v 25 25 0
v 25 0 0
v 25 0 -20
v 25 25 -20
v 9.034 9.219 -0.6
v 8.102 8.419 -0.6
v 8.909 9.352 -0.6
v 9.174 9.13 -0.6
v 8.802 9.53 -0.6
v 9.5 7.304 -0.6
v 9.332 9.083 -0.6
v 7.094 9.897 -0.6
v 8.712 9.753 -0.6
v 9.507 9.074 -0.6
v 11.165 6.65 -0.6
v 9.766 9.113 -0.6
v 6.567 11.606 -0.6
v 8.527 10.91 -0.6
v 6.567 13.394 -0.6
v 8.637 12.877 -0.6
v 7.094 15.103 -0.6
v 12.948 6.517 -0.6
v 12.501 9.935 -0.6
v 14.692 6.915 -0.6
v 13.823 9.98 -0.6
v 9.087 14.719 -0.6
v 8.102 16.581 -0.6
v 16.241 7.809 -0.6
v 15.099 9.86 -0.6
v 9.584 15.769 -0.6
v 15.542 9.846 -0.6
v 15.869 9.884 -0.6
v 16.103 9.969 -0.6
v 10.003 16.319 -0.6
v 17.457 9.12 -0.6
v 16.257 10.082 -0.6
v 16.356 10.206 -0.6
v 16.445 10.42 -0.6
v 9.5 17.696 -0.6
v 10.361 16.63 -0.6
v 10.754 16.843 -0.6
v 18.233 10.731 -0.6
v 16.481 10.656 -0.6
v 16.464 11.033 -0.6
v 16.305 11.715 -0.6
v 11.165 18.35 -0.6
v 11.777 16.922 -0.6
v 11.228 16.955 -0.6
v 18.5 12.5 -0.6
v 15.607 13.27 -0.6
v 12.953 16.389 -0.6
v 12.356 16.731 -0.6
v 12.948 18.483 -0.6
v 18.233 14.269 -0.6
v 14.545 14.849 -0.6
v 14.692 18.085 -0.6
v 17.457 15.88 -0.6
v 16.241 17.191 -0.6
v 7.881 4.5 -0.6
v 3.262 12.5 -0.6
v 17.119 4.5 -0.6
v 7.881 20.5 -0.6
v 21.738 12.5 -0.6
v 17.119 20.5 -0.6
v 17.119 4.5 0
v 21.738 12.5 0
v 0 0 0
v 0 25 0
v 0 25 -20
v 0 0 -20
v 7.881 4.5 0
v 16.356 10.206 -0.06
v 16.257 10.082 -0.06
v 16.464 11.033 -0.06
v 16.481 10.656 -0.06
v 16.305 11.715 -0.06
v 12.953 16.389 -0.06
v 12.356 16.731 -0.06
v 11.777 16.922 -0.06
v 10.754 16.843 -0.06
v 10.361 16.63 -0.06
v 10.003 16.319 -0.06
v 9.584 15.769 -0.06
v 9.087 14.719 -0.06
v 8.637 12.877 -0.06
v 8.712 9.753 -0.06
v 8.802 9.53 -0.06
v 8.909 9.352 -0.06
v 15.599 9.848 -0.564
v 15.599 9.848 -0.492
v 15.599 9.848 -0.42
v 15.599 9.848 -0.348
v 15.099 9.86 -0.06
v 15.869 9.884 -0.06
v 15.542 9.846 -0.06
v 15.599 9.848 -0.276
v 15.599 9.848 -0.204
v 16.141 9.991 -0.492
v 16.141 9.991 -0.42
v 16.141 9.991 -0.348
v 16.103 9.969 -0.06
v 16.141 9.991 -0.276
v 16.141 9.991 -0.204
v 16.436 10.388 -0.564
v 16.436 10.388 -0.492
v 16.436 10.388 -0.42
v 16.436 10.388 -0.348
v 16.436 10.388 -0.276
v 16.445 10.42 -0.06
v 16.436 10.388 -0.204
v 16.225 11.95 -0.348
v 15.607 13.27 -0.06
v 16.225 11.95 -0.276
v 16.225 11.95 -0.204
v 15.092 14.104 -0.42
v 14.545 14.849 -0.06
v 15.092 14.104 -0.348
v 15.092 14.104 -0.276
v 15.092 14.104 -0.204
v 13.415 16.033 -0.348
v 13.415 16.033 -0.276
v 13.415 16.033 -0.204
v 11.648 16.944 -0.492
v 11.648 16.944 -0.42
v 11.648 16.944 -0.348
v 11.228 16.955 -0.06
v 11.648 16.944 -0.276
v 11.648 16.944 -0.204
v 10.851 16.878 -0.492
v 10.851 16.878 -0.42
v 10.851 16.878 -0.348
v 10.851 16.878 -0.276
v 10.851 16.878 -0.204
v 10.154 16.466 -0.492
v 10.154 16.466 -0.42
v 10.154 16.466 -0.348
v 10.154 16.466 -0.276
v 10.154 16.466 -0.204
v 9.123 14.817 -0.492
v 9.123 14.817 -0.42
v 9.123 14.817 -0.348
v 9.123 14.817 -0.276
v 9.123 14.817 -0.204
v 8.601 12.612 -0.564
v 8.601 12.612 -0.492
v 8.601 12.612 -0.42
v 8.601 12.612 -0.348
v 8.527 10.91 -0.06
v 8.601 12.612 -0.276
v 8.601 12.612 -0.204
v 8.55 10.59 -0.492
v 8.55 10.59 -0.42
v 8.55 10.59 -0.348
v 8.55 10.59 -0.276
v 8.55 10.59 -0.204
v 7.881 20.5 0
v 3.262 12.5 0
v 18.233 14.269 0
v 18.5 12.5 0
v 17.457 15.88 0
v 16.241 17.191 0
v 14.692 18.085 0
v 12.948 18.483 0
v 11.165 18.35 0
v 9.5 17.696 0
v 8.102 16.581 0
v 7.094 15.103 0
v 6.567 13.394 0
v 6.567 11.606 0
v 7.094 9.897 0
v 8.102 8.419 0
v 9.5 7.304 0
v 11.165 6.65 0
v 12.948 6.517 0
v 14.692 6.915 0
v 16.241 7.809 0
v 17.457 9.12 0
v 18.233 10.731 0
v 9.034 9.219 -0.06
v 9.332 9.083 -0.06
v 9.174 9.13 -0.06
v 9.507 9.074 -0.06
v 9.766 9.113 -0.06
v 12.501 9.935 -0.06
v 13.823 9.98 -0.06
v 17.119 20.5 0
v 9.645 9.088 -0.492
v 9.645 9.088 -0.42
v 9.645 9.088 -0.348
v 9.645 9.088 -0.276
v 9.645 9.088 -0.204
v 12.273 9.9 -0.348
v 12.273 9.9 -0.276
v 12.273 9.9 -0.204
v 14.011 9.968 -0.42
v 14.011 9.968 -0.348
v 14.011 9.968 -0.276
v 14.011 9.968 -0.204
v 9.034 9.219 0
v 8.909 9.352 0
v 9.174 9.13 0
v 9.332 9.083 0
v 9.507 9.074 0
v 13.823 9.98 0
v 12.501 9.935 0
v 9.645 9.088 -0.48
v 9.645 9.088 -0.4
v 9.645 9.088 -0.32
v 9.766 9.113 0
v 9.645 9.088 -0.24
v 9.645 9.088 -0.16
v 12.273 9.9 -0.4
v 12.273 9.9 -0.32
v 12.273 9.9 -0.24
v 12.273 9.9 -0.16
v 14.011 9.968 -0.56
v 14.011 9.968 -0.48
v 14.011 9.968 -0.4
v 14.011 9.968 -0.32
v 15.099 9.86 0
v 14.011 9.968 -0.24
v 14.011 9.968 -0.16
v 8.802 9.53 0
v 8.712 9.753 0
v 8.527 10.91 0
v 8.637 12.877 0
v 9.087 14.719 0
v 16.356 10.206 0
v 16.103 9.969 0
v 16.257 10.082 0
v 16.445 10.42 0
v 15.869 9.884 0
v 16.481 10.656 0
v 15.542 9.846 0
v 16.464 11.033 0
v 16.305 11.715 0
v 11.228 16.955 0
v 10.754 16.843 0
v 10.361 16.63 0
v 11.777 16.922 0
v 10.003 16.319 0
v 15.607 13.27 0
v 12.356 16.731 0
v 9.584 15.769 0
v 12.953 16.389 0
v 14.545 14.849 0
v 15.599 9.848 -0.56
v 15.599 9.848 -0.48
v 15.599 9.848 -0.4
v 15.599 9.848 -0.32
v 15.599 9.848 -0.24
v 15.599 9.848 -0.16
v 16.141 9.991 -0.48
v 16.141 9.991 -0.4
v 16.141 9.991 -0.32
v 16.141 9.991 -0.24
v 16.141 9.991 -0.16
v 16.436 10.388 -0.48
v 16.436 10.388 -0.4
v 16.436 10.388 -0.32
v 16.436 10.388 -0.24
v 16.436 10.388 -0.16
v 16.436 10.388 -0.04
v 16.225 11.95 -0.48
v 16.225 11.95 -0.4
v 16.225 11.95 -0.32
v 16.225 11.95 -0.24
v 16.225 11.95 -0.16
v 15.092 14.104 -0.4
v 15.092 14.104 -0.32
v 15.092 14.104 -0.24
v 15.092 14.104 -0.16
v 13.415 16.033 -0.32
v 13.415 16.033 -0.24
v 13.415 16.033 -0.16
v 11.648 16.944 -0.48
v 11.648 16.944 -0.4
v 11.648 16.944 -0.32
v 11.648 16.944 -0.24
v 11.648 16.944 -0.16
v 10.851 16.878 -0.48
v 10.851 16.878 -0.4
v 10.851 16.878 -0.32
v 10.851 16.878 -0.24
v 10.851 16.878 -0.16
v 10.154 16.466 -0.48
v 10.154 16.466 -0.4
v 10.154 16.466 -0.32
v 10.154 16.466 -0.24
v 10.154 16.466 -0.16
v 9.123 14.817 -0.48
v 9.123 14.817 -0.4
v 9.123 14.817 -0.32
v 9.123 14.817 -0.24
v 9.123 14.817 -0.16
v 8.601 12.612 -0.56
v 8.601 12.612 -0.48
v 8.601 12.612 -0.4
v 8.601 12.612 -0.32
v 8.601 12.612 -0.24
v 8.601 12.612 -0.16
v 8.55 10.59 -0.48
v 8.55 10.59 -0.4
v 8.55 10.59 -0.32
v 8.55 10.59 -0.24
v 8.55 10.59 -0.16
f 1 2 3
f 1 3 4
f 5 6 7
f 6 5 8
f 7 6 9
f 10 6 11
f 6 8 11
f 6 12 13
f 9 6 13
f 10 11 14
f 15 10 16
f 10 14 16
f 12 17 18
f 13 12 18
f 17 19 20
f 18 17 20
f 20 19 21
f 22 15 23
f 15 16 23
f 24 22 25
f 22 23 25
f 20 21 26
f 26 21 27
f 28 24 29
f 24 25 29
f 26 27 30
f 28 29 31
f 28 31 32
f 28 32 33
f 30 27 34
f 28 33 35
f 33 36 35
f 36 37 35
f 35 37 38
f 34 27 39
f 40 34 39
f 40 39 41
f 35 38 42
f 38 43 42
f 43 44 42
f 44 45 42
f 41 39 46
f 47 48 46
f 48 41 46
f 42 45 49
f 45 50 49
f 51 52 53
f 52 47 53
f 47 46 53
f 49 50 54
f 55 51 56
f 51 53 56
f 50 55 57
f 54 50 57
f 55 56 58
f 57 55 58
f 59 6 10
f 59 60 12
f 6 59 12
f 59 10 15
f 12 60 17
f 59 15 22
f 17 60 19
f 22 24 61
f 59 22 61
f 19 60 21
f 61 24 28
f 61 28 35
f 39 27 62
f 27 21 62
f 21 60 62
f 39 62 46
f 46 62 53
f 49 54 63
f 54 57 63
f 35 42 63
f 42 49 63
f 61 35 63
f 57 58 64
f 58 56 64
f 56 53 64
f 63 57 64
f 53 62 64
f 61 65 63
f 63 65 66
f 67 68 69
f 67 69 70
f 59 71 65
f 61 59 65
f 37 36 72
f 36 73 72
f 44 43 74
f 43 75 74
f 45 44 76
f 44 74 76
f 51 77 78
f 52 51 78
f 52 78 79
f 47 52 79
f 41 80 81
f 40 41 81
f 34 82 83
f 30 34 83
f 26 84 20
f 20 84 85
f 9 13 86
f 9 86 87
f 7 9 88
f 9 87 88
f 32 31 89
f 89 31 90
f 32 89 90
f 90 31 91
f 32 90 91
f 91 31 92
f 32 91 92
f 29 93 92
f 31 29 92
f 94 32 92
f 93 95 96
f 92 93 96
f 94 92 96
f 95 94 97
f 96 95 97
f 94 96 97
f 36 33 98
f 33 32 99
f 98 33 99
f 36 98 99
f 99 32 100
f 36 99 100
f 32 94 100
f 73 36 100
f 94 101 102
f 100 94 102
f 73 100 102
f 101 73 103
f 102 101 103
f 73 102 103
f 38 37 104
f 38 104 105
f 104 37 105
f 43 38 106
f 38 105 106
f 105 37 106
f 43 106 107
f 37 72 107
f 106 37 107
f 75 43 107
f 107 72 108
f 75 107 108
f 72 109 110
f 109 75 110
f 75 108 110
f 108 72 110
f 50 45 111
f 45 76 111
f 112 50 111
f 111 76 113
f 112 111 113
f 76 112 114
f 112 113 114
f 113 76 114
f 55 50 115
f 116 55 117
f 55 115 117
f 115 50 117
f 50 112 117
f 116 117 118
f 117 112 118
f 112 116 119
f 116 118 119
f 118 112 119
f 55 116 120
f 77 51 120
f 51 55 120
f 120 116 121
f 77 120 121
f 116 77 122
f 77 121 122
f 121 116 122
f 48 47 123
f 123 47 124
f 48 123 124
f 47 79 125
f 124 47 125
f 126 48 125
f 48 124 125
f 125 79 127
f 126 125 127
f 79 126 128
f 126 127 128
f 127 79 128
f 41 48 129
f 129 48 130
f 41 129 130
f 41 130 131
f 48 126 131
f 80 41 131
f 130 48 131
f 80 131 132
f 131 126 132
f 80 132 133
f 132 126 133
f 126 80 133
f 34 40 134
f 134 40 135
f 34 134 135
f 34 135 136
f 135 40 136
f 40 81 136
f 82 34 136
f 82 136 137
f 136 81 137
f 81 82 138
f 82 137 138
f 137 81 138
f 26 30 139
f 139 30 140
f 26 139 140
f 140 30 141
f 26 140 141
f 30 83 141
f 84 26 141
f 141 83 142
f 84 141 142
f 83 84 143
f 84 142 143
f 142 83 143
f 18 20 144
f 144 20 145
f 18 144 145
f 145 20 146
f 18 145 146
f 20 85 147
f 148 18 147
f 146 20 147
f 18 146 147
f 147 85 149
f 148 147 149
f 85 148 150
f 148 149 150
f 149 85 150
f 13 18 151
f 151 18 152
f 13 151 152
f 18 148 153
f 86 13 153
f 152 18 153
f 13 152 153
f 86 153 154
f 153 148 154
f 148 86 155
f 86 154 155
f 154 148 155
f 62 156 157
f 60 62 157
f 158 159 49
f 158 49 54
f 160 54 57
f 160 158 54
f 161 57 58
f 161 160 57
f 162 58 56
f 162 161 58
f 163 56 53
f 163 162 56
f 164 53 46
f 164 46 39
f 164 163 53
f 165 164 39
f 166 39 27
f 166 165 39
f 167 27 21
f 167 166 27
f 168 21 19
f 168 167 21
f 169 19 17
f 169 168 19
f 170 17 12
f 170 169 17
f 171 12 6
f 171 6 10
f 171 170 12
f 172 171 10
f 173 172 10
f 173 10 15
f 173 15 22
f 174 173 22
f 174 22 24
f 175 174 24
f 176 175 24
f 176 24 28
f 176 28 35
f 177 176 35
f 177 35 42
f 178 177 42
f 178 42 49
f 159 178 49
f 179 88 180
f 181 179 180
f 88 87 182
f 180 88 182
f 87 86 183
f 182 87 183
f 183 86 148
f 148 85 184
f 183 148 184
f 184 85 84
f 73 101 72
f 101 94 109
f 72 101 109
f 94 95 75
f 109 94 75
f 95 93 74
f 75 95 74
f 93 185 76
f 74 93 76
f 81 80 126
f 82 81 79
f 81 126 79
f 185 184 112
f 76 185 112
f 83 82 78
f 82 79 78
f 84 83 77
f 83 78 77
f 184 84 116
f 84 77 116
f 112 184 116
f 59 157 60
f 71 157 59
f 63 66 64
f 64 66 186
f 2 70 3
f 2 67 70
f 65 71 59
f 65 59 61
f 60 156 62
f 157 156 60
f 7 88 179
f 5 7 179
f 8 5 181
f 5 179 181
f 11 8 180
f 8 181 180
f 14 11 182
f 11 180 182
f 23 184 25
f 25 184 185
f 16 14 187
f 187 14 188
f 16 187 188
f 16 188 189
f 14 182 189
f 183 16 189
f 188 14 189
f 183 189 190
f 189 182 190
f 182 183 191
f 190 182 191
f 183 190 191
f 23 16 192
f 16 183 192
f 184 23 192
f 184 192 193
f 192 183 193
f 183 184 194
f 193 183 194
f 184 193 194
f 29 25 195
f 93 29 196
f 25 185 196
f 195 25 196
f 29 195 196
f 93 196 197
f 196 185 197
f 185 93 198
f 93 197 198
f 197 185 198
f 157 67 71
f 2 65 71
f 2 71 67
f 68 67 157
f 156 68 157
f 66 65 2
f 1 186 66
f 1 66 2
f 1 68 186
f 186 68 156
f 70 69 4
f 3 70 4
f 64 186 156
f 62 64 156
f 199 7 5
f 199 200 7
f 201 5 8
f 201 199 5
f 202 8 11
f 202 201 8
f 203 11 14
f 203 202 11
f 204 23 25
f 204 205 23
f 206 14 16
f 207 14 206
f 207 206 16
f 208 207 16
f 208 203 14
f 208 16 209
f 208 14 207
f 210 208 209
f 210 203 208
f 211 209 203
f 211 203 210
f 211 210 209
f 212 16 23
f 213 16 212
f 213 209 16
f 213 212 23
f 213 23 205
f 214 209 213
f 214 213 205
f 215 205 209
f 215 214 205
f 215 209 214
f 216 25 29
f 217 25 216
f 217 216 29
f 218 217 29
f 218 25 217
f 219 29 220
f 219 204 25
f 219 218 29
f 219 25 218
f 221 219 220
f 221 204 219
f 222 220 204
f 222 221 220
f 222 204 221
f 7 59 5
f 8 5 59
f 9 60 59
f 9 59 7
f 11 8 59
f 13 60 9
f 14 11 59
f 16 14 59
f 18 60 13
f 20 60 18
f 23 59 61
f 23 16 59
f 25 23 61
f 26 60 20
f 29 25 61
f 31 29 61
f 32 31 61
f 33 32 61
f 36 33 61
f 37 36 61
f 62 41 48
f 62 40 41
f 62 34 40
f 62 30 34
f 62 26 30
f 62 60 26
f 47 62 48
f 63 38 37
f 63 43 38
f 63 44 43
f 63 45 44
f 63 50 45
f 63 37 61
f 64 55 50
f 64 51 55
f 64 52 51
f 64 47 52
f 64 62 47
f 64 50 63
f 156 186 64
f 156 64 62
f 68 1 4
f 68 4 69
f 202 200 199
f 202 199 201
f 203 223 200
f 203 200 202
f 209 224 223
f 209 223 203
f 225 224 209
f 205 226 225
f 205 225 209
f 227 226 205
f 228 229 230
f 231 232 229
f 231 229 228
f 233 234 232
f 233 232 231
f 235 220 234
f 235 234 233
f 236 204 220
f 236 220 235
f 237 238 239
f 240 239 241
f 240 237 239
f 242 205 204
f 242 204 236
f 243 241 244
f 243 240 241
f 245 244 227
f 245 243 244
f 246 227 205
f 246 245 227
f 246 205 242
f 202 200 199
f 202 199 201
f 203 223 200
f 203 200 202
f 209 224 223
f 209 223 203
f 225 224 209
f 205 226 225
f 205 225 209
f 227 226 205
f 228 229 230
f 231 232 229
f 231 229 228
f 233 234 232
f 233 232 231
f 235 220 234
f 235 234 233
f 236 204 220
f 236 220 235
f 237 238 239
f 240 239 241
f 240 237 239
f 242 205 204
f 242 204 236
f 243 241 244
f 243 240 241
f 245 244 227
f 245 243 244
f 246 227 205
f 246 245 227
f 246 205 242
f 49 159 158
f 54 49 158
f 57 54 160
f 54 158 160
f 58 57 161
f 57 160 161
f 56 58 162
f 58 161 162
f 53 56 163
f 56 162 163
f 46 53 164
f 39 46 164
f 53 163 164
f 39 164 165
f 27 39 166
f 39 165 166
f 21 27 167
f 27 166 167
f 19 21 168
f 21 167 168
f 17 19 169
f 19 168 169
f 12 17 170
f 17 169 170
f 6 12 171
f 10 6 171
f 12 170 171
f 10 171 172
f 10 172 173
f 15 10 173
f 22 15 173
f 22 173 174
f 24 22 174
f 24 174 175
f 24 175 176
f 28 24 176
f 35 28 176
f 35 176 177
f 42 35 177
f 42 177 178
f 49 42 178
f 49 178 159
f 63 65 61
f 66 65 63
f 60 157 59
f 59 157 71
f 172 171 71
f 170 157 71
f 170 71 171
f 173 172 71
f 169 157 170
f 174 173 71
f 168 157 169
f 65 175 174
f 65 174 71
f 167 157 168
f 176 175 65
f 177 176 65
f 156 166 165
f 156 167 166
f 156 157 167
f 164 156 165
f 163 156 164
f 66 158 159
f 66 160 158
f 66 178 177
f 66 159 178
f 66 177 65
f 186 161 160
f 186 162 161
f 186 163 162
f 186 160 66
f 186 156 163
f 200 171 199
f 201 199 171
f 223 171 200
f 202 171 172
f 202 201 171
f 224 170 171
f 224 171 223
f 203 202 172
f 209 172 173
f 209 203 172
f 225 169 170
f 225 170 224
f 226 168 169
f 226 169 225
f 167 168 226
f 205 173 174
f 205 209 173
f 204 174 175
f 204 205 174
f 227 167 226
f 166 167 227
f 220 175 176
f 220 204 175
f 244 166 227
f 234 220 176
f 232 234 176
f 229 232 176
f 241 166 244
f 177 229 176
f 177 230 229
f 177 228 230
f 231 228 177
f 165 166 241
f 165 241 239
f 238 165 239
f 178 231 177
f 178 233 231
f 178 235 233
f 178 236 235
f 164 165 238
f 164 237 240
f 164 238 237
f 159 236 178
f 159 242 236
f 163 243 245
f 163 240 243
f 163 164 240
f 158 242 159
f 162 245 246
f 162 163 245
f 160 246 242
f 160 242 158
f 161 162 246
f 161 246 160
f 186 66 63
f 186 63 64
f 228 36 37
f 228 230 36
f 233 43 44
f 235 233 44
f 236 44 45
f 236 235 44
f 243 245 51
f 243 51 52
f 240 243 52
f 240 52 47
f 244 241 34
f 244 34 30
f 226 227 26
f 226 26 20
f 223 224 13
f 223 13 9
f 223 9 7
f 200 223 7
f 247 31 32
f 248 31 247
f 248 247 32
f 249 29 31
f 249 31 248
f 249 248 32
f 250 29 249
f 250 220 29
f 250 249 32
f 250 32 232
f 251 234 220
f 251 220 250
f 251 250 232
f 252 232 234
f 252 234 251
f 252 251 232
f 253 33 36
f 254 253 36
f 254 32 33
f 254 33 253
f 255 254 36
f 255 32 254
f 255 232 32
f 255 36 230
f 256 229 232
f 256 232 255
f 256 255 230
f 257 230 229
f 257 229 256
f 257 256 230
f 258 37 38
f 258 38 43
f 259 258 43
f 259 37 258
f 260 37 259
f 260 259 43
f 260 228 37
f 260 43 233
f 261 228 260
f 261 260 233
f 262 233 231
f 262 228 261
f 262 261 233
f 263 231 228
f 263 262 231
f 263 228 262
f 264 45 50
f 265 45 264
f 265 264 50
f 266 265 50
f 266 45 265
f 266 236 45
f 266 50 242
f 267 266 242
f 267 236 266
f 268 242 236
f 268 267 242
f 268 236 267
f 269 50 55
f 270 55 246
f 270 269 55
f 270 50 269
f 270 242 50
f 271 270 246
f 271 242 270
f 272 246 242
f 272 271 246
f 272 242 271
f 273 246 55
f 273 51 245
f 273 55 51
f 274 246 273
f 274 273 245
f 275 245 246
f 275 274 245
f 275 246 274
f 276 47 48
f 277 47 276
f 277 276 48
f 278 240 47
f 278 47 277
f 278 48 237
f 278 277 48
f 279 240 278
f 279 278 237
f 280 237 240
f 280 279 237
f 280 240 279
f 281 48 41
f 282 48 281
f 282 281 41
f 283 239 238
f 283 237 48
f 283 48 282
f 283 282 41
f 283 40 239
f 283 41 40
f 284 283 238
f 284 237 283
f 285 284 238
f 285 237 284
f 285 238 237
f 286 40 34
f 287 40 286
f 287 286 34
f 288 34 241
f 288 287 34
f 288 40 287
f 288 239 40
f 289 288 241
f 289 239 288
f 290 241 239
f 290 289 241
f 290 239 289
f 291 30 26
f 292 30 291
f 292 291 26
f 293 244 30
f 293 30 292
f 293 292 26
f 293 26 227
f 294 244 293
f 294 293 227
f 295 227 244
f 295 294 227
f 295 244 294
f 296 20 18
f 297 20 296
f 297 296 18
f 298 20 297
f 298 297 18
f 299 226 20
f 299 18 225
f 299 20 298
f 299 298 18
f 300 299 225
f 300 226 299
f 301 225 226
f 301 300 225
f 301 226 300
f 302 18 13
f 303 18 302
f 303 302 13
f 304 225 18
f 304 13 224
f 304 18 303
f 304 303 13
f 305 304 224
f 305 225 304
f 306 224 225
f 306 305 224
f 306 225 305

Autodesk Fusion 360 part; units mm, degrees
sketch "Sketch1" plane through (0, 0, 0) normal (0, 0, 1) x (1, 0, 0) in component "Multipart Demo"
  line L0 (0, 0) -> (25, 0)
  line L1 (25, 0) -> (25, 25)
  line L2 (25, 25) -> (0, 25)
  line L3 (0, 25) -> (0, 0)
  line L4 (7.8812, 20.5) -> (3.2624, 12.5)
  line L5 (3.2624, 12.5) -> (7.8812, 4.5)
  line L6 (7.8812, 4.5) -> (17.1188, 4.5)
  line L7 (17.1188, 4.5) -> (21.7376, 12.5)
  line L8 (21.7376, 12.5) -> (17.1188, 20.5)
  line L9 (17.1188, 20.5) -> (7.8812, 20.5)
  circle A0 centre (12.5, 12.5) radius 6
  spline S0 degree 5 poles (8.9094, 9.3519) (9.0191, 9.2045) (9.2754, 9.0123) (9.7707, 9.0232) (10.6665, 9.4656) (12.2037, 10.0156) (14.0226, 10.0885) (15.8151, 9.6278) (16.7222, 10.0857) (16.468, 11.7824) (15.2326, 14.1604) (13.4321, 16.3126) (11.5676, 17.3295) (10.0315, 16.7793) (8.9918, 14.9633) (8.4816, 12.5578) (8.4559, 10.8091) (8.6176, 9.8966) (8.7998, 9.4993) (8.9094, 9.3519) knots 0 0 0 0 0 0 0.066667 0.133333 0.2 0.266667 0.333333 0.4 0.466667 0.533333 0.6 0.666667 0.733333 0.8 0.866667 0.933333 1 1 1 1 1 1
  line L10 (13.9946, 9.9481) -> (16.204, 9.7727)
  point P0 (12.5, 12.5)
  point P1 (15.0993, 9.8604)
  point P2 (12.0833, 16.8393)
  dimension "d1" = 8
  dimension "d2" = 12
extrude "Extrude1" add sketch "Sketch1" against normal blind 20 contours L0 L1 L2 L3 | L4 L5 L6 L7 L8 L9 | A0 | S0 makes body 1 in component "Multipart Demo"
extrude "Extrude2" cut sketch "Sketch1" against normal blind 0.6 contours L4 L5 L6 L7 L8 L9 | S0 bodies 1 in component "Multipart Demo"
extrude "Extrude4" add sketch "Sketch1" against normal blind 0.6 separate body contours L4 L5 L6 L7 L8 L9 makes body 2 in component "Multipart Demo"
extrude "Extrude5" add 1 faces at (11.9592, 12.8035, -0.6) along direction (0, 0, 1) blind 0.6 on bodies 1 bodies 1 in component "Multipart Demo"
extrude "Extrude6" cut 1 faces at (11.5, 14.2321, 0) along direction (0, 0, -1) blind 0.6 on bodies 1 bodies 1 in component "Multipart Demo"
extrude "Extrude7" add sketch "Sketch1" against normal blind 0.6 separate body contours A0 | S0 makes body 3 in component "Multipart Demo"
extrude "Extrude8" cut sketch "Sketch1" against normal blind 0.6 contours S0 bodies 3 in component "Multipart Demo"
extrude "Extrude9" add sketch "Sketch1" against normal blind 0.06 contours S0 bodies 3 in component "Multipart Demo"
extrude "Extrude10" add sketch "Sketch1" against normal blind 0.6 contours S0 bodies 1 in component "Multipart Demo"
component "Multipart Demo" placed x (1, 0, 0) y (0, 1, 0) z (0, 0, 1) at (0, 0, 0)
